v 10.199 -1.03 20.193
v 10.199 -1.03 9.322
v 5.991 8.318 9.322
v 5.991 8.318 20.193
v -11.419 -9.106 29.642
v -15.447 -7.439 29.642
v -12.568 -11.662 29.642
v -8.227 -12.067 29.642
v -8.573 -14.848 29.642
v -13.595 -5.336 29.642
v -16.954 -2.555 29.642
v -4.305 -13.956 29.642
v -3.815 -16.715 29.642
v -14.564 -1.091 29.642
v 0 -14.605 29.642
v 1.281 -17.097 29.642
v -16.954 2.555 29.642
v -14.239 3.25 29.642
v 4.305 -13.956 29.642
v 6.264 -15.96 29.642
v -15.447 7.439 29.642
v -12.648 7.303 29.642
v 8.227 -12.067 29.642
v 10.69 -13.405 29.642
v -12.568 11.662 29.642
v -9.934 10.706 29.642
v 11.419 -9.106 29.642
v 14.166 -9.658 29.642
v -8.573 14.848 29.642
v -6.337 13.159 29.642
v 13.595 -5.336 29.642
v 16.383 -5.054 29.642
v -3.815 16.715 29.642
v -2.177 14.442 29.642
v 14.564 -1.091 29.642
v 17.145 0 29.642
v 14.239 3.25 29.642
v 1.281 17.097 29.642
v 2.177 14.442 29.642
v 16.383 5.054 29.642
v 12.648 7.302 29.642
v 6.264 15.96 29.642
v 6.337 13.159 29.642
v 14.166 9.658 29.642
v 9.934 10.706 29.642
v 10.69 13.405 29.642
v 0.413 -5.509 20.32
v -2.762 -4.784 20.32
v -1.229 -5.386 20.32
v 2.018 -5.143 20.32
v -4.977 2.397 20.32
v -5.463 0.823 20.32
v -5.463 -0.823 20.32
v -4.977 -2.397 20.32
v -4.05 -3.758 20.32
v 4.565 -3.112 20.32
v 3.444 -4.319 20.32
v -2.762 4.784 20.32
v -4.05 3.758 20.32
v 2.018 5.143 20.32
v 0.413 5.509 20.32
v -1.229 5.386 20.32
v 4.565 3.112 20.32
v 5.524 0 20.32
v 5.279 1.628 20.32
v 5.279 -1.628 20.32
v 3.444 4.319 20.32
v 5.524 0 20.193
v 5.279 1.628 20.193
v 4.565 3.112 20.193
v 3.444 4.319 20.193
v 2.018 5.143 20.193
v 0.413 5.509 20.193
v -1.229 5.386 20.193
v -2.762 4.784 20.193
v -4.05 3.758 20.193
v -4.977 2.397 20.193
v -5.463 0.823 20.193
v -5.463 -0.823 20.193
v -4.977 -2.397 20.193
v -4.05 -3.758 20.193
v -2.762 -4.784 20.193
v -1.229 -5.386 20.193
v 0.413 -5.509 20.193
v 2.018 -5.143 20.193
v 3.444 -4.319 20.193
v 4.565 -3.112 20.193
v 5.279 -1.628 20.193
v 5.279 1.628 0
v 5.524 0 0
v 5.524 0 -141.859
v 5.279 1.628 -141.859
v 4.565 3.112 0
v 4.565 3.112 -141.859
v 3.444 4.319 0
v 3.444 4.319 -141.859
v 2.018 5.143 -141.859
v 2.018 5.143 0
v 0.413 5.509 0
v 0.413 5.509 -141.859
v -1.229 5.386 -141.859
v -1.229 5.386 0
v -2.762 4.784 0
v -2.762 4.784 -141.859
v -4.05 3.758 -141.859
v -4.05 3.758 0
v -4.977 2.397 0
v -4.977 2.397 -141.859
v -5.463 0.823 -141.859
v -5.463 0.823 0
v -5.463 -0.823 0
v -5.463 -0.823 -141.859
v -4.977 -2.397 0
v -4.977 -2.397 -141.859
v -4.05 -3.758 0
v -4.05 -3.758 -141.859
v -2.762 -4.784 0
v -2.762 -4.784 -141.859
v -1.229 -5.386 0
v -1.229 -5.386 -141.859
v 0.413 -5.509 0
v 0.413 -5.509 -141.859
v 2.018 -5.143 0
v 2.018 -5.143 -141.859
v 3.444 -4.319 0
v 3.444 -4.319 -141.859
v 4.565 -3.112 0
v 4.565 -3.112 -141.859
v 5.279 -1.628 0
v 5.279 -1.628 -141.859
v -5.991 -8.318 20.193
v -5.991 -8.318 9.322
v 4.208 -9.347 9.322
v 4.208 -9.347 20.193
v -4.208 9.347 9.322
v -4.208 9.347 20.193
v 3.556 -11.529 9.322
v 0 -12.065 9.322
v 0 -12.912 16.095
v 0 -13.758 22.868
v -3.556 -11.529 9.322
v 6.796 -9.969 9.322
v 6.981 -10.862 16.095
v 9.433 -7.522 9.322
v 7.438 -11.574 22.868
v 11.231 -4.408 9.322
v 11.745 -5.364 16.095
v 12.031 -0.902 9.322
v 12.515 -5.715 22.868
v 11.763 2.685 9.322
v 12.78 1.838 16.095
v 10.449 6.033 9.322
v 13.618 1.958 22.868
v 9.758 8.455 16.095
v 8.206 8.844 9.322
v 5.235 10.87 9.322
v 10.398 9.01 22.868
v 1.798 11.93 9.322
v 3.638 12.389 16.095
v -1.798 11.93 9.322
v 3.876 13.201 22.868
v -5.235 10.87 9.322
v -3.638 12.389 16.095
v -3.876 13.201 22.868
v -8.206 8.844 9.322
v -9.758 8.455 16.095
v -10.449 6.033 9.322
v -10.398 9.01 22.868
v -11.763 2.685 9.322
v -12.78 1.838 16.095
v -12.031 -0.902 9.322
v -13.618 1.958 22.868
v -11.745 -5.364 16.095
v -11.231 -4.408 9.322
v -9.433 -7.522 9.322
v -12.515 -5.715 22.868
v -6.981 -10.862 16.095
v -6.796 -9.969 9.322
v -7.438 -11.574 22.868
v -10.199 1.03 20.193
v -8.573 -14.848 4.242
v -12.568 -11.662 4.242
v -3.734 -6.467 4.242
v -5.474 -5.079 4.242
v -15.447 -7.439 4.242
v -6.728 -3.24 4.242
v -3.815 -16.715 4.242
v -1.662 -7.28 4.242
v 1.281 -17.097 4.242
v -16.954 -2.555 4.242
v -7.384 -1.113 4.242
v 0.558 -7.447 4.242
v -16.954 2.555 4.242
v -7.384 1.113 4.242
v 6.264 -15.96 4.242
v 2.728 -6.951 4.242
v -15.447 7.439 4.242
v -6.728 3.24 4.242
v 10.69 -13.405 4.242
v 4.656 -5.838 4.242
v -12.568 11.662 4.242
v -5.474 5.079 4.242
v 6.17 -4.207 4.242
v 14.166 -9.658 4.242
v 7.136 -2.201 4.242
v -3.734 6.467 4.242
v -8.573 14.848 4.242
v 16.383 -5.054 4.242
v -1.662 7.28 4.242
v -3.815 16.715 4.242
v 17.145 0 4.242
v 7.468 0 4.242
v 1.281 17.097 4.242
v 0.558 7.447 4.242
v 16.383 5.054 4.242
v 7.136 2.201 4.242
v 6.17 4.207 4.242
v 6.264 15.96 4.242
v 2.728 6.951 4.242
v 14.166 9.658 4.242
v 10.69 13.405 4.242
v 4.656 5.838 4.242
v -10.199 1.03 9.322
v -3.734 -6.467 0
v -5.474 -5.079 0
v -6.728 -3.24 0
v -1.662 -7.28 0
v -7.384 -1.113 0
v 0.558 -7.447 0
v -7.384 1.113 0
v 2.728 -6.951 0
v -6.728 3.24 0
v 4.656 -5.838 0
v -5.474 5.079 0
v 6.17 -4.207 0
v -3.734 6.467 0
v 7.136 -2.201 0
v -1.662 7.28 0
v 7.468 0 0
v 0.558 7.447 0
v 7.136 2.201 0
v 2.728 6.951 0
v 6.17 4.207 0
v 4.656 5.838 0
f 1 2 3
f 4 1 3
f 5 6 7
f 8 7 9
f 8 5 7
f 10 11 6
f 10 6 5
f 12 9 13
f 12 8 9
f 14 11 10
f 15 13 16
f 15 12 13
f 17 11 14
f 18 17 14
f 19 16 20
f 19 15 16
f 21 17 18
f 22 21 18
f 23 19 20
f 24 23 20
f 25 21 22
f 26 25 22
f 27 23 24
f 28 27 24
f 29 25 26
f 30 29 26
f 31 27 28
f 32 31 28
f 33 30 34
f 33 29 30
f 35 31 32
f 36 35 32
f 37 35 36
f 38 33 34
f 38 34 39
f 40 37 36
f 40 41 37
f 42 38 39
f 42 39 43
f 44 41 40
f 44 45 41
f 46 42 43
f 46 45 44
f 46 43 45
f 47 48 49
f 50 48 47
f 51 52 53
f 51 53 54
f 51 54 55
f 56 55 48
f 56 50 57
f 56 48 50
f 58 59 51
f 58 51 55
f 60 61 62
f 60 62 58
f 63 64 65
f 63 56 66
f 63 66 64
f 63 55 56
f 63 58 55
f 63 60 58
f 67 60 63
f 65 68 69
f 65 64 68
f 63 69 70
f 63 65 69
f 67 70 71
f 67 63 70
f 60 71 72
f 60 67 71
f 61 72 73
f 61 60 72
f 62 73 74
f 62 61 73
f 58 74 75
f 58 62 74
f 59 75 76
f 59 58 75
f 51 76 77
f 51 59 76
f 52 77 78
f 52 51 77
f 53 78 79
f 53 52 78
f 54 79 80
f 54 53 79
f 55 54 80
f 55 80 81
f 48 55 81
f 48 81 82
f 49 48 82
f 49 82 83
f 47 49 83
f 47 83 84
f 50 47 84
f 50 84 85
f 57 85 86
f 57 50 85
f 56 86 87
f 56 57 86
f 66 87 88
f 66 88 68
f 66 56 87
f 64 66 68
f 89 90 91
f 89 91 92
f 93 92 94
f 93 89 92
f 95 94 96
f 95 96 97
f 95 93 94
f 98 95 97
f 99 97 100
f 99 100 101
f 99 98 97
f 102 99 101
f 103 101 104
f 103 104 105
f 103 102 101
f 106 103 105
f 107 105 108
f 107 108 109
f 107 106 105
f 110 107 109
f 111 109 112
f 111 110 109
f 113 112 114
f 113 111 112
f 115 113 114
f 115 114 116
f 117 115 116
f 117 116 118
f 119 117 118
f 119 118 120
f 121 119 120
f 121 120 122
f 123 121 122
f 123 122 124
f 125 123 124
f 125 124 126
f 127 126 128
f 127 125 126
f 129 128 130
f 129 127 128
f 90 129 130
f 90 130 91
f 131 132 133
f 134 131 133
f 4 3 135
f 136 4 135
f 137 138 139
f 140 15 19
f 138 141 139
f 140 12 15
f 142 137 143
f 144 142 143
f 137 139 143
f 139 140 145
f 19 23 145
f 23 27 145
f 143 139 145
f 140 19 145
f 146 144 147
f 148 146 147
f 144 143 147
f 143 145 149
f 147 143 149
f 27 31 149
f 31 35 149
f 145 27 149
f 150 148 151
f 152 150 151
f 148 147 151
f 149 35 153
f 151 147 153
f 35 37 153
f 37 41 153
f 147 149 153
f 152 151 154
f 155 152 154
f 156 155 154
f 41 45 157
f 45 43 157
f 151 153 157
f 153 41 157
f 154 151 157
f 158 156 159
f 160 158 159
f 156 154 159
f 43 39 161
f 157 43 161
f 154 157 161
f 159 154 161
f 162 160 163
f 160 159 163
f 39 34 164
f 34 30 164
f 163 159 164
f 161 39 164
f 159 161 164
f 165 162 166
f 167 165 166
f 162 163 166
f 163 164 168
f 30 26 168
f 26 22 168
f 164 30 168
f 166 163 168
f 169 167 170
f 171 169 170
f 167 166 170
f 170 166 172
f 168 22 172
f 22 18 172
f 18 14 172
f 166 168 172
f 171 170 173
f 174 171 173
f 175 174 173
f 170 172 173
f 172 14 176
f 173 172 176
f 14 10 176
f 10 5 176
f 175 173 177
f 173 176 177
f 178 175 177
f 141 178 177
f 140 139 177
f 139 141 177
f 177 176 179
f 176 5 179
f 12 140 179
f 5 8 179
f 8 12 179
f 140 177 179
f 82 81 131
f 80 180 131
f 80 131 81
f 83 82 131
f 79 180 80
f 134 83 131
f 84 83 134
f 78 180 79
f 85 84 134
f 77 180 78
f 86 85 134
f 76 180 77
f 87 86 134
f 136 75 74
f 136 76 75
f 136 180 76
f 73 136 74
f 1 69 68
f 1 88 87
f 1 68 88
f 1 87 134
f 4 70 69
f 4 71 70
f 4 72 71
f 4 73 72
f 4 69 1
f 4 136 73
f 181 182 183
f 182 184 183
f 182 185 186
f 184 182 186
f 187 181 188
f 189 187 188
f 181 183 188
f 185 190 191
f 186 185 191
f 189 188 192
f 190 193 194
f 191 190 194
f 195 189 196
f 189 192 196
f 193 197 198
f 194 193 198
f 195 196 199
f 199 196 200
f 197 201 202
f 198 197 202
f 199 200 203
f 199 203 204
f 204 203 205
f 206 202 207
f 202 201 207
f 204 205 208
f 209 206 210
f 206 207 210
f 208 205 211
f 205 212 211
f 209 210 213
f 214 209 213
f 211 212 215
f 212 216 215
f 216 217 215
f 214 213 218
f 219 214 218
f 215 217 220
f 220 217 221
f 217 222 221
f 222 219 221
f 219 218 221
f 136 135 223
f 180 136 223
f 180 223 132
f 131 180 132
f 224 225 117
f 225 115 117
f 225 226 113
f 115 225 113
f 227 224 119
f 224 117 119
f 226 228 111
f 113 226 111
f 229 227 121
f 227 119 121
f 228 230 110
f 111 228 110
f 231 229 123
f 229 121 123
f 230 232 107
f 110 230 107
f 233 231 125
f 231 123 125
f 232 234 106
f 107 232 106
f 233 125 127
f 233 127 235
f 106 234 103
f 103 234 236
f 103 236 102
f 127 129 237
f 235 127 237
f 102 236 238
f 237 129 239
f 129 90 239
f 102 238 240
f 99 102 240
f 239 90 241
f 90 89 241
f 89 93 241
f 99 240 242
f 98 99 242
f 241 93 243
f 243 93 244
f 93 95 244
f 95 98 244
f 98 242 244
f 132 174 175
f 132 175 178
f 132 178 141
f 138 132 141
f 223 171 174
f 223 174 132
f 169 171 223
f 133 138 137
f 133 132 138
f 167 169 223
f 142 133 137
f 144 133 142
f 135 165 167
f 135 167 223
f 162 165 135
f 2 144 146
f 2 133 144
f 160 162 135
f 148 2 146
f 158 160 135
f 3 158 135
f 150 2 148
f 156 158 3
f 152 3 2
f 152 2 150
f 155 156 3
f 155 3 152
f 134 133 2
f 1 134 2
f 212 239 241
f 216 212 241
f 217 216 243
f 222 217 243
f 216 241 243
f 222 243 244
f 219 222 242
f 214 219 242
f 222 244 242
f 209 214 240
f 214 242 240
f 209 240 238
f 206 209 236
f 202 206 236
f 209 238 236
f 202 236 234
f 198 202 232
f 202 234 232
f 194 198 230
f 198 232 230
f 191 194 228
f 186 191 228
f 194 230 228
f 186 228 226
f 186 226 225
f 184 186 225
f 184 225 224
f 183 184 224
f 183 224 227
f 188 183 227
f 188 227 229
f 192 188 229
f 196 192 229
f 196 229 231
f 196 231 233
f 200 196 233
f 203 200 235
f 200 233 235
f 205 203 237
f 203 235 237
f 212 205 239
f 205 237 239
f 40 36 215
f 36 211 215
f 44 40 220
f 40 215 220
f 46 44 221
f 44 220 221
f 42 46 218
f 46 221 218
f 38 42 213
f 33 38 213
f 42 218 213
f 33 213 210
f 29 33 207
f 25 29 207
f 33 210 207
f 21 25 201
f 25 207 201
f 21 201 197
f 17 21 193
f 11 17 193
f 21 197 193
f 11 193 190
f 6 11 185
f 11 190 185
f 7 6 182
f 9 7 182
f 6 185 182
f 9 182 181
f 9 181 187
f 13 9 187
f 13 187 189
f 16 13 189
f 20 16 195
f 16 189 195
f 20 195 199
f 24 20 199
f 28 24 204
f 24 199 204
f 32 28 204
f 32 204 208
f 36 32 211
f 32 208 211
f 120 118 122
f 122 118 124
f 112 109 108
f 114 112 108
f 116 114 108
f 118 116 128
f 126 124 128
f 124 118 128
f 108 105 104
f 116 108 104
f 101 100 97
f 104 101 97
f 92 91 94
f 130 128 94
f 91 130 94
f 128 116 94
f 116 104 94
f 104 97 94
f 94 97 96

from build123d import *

# Parameters (mm, degrees)
F0_R          = 5.5245
F1_DEPTH      = 20.32
F1_DEPTH_BACK = 141.859
F2_R          = 7.4676
F2_R_2        = 5.5245
F3_DEPTH      = 4.2418
F4_R          = 17.145
F5_DEPTH      = 5.08
F7_DEPTH      = 10.8712
F8_R          = 17.145
F8_R_2        = 14.605
F9_DEPTH      = 20.32


with BuildPart() as f1:
    # F0 (on Top) → F1 (new body, two sides)
    with BuildSketch(Plane.XY) as f1_sk:
        Circle(F0_R)
    extrude(amount=F1_DEPTH)
    extrude(f1_sk.sketch, amount=-F1_DEPTH_BACK)

    # F2 (on Top) → F3 (join)
    with BuildSketch(Plane.XY):
        Circle(F2_R)
        Circle(F2_R_2, mode=Mode.SUBTRACT)
    extrude(amount=F3_DEPTH)

    # F4 (on face) → F5 (join)
    with BuildSketch(Plane.XY.offset(4.2418)):
        Circle(F4_R)
    extrude(amount=F5_DEPTH)

    # F6 (on face) → F7 (join)
    with BuildSketch(Plane.XY.offset(9.3218)):
        Polygon((4.207769, -9.34719), (10.198788, -1.02956), (5.991019, 8.31763), (-4.207769, 9.34719), (-10.198788, 1.02956), (-5.991019, -8.31763), align=None)
    extrude(amount=F7_DEPTH)

    # F8 (on face) → F9 (join)
    with BuildSketch(Plane.XY.offset(9.3218)):
        Circle(F8_R)
        Circle(F8_R_2, mode=Mode.SUBTRACT)
    extrude(amount=F9_DEPTH)

    # F10 (on Right) → F11 (revolve)
    with BuildSketch(Plane.YZ):
        Polygon((-14.605, 29.6418), (-14.605, 9.3218), (-12.065, 9.3218), align=None)
    revolve(axis=Axis((0, 0, 15.219002), (0, 0, 1)))


solid = f1.part
